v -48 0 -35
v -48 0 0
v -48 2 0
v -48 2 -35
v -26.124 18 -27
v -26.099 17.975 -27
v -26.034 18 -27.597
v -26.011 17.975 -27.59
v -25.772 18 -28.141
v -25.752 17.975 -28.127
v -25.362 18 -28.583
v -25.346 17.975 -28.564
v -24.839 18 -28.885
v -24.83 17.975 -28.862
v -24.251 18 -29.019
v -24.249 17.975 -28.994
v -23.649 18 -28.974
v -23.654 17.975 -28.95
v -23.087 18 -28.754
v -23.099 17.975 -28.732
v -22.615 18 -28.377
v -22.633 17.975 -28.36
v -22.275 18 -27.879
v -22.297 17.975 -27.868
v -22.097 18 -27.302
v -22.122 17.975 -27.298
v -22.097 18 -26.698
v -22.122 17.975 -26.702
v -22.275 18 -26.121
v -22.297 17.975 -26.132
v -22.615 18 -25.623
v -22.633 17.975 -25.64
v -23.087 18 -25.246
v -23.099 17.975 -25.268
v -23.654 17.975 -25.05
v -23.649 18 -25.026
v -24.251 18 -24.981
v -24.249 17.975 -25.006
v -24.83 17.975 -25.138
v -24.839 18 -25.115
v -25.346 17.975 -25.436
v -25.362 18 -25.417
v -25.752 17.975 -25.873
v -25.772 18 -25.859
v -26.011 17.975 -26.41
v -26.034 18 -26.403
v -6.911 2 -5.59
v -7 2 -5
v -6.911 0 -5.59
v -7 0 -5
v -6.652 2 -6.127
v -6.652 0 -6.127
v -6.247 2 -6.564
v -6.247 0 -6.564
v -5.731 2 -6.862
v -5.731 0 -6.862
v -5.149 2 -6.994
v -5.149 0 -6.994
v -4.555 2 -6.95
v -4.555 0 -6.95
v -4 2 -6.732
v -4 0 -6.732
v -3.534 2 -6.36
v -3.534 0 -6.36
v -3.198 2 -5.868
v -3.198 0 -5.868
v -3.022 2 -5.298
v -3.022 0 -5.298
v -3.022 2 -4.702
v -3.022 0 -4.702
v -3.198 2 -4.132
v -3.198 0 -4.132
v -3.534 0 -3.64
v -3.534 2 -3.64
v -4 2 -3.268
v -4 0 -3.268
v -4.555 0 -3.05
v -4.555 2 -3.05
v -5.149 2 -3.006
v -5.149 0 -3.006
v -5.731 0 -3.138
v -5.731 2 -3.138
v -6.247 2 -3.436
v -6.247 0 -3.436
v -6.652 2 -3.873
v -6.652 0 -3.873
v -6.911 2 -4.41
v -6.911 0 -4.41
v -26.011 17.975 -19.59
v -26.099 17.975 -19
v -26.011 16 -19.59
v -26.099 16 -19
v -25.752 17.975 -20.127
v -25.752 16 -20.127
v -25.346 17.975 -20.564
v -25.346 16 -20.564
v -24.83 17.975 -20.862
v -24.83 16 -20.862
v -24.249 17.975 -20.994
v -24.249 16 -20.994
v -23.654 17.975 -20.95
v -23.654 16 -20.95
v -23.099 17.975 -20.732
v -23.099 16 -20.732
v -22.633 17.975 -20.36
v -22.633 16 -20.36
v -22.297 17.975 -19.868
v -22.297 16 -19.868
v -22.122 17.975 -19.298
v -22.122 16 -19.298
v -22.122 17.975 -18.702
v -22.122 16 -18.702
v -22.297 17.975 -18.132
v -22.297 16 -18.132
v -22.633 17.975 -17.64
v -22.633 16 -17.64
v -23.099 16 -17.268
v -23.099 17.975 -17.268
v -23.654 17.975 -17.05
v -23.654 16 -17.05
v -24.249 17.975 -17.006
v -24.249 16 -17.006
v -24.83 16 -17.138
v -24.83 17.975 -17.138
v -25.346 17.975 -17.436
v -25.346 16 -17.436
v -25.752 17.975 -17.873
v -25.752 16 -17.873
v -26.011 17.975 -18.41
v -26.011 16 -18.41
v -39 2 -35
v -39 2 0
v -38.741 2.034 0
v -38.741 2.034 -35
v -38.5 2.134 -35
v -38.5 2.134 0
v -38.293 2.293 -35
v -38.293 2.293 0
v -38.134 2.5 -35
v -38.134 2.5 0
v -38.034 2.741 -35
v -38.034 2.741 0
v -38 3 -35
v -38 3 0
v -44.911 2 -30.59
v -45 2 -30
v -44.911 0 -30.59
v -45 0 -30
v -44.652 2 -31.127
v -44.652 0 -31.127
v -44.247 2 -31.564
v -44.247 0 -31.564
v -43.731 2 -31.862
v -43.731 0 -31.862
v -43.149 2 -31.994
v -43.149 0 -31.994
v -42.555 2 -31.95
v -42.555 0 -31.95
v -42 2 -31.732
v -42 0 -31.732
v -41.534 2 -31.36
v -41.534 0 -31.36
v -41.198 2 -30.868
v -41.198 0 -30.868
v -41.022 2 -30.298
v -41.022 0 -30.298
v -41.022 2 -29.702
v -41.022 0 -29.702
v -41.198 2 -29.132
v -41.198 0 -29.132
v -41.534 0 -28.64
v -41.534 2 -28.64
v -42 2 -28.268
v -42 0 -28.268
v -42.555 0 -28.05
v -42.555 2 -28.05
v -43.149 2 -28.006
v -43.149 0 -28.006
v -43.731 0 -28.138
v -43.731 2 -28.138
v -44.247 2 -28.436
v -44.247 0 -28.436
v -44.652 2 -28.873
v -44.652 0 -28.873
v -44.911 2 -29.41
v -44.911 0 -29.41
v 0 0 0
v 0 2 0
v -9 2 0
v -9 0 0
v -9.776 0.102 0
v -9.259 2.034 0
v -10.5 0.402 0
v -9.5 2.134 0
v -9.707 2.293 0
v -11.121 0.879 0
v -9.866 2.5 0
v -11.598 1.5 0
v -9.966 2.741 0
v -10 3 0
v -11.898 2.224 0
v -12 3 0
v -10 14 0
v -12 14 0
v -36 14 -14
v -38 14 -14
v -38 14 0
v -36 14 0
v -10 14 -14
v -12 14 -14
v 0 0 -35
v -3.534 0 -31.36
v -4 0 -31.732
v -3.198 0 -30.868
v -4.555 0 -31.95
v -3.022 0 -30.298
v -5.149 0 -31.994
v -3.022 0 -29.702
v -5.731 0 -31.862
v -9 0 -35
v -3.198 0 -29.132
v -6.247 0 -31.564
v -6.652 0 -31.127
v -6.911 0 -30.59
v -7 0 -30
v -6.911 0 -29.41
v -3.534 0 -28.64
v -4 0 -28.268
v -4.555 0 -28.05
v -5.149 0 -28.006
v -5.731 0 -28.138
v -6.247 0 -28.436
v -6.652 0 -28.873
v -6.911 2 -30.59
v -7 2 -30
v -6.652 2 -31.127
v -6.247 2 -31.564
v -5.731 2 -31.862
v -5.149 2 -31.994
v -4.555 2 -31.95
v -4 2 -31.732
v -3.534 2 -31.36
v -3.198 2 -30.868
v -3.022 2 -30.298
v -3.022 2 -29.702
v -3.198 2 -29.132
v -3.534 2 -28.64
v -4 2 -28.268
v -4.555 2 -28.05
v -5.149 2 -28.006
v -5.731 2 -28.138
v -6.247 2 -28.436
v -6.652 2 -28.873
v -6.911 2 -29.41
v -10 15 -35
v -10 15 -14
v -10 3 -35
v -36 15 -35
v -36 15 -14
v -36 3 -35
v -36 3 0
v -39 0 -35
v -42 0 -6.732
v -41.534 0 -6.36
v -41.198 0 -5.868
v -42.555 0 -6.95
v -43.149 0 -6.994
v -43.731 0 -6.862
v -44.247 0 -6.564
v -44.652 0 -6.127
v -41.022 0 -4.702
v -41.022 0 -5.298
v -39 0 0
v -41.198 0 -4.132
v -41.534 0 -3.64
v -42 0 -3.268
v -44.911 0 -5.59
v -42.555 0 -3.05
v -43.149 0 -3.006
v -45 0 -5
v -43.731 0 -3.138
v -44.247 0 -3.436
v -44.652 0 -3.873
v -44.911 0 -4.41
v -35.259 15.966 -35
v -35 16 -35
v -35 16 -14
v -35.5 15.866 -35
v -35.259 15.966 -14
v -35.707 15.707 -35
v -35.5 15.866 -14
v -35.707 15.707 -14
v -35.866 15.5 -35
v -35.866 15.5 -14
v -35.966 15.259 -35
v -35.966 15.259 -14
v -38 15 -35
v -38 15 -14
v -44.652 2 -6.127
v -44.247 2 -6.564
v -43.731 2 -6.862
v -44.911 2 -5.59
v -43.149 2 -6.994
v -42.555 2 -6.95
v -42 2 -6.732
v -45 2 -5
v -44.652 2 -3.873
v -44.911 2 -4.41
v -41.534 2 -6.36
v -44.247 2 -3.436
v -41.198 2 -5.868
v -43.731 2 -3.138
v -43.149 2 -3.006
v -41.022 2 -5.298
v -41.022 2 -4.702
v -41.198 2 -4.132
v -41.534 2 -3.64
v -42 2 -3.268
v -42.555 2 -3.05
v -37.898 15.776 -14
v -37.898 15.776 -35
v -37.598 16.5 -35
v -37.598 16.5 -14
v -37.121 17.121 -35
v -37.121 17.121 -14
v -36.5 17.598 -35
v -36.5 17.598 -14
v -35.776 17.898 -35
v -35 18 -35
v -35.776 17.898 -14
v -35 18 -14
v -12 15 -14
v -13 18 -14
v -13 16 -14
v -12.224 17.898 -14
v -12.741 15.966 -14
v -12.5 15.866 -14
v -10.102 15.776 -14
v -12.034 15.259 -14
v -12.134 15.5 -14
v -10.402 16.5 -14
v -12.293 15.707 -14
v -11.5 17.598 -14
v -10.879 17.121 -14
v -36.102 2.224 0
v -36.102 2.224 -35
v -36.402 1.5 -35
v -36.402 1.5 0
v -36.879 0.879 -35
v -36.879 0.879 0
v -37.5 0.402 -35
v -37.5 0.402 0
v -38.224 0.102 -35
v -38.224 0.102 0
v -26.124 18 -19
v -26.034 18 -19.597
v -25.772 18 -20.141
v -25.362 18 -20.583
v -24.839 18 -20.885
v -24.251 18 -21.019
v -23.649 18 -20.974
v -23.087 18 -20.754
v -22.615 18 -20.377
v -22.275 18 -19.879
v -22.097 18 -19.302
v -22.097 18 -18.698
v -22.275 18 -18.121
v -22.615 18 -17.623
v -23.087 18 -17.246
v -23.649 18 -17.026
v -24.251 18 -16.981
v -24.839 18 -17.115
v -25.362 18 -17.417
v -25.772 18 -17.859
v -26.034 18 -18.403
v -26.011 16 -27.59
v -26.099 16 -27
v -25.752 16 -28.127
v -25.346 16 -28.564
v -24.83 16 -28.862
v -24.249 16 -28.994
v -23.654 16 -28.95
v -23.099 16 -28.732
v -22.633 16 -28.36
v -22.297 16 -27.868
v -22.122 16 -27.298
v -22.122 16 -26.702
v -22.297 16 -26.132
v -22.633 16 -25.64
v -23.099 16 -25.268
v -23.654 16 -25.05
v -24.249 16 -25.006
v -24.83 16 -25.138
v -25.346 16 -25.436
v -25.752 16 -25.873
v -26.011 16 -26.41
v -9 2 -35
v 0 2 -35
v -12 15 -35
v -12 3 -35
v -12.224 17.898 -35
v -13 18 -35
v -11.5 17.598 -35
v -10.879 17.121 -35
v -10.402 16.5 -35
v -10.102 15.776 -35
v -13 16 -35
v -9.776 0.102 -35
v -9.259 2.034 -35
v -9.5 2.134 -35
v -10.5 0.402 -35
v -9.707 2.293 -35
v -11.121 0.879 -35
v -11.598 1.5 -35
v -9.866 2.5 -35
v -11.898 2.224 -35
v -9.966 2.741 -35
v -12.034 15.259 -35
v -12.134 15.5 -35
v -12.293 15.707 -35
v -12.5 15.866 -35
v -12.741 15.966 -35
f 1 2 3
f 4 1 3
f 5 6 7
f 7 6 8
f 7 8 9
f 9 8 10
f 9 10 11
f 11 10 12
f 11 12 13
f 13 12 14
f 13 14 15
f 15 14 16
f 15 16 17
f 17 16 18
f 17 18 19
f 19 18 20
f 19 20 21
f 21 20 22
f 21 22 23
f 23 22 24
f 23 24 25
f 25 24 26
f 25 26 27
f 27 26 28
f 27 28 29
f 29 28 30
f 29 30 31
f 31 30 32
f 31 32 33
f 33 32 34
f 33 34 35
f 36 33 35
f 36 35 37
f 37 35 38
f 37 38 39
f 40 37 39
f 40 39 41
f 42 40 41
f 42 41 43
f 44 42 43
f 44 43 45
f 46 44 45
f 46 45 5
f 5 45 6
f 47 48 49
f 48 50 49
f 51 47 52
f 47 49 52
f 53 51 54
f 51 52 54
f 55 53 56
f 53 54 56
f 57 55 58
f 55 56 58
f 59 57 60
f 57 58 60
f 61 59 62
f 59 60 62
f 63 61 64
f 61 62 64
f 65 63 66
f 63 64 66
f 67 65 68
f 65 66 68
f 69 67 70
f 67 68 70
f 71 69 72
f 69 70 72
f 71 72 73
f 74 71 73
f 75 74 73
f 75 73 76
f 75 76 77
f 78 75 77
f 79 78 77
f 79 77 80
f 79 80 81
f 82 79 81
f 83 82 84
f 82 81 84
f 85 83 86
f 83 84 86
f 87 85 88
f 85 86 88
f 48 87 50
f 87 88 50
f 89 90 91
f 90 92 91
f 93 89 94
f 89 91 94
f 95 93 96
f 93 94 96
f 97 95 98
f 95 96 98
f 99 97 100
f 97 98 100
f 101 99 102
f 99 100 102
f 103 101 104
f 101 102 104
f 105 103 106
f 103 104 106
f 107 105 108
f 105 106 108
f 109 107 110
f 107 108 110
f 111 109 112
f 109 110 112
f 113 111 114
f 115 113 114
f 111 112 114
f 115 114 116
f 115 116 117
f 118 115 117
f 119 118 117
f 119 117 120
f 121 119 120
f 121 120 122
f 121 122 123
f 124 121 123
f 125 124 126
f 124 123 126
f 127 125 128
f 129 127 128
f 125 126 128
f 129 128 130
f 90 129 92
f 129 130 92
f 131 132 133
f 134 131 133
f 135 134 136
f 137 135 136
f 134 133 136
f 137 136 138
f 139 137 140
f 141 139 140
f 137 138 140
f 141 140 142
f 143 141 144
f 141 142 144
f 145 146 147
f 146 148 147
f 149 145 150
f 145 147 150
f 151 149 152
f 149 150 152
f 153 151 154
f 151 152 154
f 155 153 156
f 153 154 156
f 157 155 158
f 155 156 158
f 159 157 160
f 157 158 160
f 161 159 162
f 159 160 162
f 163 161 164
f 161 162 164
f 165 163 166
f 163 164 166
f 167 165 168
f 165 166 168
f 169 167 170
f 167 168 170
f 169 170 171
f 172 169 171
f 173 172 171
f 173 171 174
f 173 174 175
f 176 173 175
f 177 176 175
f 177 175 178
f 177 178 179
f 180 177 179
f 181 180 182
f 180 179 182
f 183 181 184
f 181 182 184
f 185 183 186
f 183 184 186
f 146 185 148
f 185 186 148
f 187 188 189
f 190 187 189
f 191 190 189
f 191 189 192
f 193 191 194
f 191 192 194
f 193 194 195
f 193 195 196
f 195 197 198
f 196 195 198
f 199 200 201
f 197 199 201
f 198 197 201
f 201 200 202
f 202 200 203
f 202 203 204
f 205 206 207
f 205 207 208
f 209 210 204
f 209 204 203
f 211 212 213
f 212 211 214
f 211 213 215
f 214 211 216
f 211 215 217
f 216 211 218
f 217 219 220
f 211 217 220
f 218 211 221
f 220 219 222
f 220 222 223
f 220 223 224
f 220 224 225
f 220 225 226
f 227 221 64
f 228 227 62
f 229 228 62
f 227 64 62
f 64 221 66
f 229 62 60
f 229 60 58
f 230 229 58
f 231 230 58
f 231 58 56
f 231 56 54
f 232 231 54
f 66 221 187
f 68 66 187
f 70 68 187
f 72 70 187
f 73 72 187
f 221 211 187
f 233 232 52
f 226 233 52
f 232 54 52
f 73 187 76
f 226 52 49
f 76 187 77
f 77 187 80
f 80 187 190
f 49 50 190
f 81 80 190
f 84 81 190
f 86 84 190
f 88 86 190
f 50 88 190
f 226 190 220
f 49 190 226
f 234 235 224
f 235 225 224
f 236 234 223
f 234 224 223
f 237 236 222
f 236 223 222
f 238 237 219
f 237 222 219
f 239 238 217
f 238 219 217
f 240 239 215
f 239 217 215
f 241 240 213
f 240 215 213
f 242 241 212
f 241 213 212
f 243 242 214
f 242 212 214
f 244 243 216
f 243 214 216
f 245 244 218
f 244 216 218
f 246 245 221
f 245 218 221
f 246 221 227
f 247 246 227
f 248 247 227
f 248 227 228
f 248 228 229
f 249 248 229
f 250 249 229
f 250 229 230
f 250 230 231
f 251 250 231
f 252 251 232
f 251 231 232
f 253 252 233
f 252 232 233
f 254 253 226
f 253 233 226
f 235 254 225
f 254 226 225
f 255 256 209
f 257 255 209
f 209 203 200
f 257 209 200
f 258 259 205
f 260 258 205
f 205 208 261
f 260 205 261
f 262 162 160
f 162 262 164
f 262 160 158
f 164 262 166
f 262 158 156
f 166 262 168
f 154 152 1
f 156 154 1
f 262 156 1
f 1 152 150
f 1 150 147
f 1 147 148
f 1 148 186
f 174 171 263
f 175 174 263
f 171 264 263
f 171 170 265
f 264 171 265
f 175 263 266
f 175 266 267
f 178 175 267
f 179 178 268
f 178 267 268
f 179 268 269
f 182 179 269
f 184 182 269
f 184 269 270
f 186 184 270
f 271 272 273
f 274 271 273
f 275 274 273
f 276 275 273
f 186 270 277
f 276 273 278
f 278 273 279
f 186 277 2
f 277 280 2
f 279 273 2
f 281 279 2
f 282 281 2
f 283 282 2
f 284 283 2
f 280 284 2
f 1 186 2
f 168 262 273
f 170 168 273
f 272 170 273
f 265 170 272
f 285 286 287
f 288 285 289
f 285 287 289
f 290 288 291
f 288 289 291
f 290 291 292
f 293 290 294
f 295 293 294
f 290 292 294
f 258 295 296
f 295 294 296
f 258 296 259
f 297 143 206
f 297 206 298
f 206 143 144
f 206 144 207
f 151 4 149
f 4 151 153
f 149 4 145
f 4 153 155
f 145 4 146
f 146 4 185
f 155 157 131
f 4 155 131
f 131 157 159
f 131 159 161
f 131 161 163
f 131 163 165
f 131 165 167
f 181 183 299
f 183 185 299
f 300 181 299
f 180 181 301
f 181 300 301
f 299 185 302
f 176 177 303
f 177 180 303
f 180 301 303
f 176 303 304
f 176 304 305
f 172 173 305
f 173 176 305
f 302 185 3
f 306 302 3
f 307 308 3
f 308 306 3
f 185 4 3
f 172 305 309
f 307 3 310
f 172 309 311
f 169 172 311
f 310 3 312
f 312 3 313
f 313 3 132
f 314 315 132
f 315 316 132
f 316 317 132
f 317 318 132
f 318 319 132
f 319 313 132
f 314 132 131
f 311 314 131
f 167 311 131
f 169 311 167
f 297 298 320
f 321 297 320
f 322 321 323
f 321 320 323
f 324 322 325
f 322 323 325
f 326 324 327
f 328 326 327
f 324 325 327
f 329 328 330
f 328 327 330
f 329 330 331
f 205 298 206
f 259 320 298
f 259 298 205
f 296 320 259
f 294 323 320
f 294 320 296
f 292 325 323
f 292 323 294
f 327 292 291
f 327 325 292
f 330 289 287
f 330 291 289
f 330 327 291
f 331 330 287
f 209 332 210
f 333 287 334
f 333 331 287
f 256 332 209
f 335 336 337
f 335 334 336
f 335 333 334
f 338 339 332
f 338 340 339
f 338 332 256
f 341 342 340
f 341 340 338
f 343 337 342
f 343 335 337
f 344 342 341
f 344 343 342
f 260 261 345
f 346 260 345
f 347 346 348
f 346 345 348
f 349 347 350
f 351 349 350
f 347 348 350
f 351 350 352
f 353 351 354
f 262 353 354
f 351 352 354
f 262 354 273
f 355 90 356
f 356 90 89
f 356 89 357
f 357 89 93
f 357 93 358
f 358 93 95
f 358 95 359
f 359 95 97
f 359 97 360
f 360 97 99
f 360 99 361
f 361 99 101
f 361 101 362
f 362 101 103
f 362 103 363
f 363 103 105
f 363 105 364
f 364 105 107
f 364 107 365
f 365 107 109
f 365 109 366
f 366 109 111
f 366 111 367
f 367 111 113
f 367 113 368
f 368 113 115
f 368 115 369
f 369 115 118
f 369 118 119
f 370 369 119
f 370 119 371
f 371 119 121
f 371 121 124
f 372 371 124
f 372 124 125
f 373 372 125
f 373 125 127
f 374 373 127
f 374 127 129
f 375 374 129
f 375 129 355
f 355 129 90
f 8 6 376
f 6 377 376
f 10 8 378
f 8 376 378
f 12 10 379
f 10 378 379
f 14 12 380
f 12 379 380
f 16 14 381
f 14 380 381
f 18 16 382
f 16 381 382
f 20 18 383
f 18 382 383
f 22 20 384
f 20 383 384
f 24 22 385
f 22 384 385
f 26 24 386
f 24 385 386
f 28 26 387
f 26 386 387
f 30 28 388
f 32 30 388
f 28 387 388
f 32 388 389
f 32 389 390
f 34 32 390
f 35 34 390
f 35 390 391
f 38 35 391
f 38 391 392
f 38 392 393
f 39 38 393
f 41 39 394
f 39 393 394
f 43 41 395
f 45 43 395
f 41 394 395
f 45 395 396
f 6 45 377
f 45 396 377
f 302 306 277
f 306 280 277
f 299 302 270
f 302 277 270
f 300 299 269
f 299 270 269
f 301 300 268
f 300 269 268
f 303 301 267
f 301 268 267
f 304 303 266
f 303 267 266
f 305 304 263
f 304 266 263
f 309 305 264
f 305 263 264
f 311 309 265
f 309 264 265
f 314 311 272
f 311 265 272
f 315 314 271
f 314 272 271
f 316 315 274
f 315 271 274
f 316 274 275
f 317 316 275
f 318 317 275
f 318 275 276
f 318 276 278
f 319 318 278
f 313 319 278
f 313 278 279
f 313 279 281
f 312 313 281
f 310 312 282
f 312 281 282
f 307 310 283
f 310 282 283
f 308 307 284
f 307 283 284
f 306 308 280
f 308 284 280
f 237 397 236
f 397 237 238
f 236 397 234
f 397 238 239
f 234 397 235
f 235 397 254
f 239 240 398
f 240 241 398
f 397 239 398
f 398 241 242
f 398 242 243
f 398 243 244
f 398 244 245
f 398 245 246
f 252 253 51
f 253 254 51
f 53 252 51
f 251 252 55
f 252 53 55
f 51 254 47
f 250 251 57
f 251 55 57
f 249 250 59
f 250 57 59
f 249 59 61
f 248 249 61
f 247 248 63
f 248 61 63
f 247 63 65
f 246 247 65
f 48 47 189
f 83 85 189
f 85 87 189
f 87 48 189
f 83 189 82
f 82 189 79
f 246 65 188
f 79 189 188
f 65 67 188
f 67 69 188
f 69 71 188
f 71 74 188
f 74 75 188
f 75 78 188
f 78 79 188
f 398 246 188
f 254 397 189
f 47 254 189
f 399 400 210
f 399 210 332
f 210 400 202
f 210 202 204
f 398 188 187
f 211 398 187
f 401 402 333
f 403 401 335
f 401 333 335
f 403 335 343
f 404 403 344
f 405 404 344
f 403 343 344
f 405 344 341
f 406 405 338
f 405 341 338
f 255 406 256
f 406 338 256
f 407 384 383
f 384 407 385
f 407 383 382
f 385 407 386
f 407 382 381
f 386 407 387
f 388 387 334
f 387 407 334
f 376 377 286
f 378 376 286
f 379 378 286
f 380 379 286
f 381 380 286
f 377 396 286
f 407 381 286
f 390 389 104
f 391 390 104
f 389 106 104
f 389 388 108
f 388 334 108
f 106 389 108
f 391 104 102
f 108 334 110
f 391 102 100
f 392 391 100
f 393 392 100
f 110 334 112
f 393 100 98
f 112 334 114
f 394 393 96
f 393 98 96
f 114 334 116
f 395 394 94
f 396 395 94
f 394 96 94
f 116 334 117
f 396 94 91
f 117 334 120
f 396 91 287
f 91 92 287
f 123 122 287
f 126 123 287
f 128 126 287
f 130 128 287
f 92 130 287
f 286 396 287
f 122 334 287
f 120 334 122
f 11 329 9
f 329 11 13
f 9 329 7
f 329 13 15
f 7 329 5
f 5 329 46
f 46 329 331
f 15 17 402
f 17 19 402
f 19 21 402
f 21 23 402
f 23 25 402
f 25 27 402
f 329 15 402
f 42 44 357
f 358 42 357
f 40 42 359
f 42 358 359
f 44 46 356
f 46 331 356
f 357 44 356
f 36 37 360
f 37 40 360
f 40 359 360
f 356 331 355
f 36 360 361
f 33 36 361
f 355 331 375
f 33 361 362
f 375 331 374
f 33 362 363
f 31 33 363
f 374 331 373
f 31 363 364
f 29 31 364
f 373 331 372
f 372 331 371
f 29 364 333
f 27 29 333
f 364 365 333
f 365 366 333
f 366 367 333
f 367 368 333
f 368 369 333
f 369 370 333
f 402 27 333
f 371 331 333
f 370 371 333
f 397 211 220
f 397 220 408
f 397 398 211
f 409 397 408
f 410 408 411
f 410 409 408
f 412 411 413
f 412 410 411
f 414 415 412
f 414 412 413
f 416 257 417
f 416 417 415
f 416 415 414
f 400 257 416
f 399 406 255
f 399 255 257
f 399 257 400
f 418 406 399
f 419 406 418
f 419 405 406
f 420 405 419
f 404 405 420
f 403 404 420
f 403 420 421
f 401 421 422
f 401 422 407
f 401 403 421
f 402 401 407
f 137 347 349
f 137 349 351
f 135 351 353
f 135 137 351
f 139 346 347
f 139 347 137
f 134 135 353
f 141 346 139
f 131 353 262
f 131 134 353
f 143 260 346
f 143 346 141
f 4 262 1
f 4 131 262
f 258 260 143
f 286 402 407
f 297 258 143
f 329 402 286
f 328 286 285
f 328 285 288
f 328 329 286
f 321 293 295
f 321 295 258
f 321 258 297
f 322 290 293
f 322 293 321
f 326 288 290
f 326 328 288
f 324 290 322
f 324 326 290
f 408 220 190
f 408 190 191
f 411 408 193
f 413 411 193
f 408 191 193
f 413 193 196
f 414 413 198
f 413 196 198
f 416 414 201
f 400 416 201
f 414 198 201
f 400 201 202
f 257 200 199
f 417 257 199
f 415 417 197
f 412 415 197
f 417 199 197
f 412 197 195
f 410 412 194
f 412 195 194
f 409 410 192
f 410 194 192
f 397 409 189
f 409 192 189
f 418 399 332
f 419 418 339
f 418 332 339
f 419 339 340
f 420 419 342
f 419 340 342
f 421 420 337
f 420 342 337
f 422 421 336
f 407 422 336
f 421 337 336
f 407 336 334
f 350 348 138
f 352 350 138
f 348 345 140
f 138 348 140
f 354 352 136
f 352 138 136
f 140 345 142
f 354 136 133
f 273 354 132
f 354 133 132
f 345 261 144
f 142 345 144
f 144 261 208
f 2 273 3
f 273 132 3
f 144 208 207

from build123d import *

# Parameters (mm, degrees)
BASE_FLANGE1_DEPTH                 = 35
SKETCH6_W                          = 28
SKETCH6_H                          = 14
CUT_EXTRUDE1_DEPTH                 = 4
F_4_0_4_DIAMETER_HOLE1_D           = 4
F_4_0_4_DIAMETER_HOLE1_CSINK_D     = 4.05
F_4_0_4_DIAMETER_HOLE1_CSINK_ANGLE = 90


# Sheet-metal steps are written as plain solids
with BuildPart() as part:
    # Sketch1 → Base-Flange1 (new body)
    with BuildSketch(Plane.XY):
        with BuildLine():
            Line((0, 0), (-9, 0))
            ThreePointArc((-9, 0), (-11.121320344, 0.878679656), (-12, 3))
            Line((-12, 3), (-12, 15))
            ThreePointArc((-12, 15), (-12.292893219, 15.707106781), (-13, 16))
            Line((-13, 16), (-35, 16))
            ThreePointArc((-35, 16), (-35.707106781, 15.707106781), (-36, 15))
            Line((-36, 15), (-36, 3))
            ThreePointArc((-36, 3), (-36.878679656, 0.878679656), (-39, 0))
            Line((-39, 0), (-48, 0))
            Line((-48, 0), (-48, 2))
            Line((-48, 2), (-39, 2))
            ThreePointArc((-39, 2), (-38.292893219, 2.292893219), (-38, 3))
            Line((-38, 3), (-38, 15))
            ThreePointArc((-38, 15), (-37.121320344, 17.121320344), (-35, 18))
            Line((-35, 18), (-13, 18))
            ThreePointArc((-13, 18), (-10.878679656, 17.121320344), (-10, 15))
            Line((-10, 15), (-10, 3))
            ThreePointArc((-10, 3), (-9.707106781, 2.292893219), (-9, 2))
            Line((-9, 2), (0, 2))
            Line((0, 2), (0, 0))
        make_face()
    extrude(amount=-BASE_FLANGE1_DEPTH)

    # Sketch6 → Cut-Extrude1 (cut)
    with BuildSketch(Plane(origin=(0, 18, 0), x_dir=(1, 0, 0), z_dir=(0, 1, 0))):
        with Locations((-24, 7)):
            Rectangle(SKETCH6_W, SKETCH6_H)
    extrude(amount=-CUT_EXTRUDE1_DEPTH, mode=Mode.SUBTRACT)

    # Ø4.0 (4) Diameter Hole1 (through all)
    with Locations(Plane(origin=(0, 18, 0), x_dir=(1, 0, 0), z_dir=(0, 1, 0))):
        with Locations((-24.099356194, 27), (-24.099356194, 19), (-43, 30), (-43, 5), (-5, 5), (-5, 30)):
            CounterSinkHole(F_4_0_4_DIAMETER_HOLE1_D / 2, F_4_0_4_DIAMETER_HOLE1_CSINK_D / 2, counter_sink_angle=F_4_0_4_DIAMETER_HOLE1_CSINK_ANGLE)


solid = part.part
